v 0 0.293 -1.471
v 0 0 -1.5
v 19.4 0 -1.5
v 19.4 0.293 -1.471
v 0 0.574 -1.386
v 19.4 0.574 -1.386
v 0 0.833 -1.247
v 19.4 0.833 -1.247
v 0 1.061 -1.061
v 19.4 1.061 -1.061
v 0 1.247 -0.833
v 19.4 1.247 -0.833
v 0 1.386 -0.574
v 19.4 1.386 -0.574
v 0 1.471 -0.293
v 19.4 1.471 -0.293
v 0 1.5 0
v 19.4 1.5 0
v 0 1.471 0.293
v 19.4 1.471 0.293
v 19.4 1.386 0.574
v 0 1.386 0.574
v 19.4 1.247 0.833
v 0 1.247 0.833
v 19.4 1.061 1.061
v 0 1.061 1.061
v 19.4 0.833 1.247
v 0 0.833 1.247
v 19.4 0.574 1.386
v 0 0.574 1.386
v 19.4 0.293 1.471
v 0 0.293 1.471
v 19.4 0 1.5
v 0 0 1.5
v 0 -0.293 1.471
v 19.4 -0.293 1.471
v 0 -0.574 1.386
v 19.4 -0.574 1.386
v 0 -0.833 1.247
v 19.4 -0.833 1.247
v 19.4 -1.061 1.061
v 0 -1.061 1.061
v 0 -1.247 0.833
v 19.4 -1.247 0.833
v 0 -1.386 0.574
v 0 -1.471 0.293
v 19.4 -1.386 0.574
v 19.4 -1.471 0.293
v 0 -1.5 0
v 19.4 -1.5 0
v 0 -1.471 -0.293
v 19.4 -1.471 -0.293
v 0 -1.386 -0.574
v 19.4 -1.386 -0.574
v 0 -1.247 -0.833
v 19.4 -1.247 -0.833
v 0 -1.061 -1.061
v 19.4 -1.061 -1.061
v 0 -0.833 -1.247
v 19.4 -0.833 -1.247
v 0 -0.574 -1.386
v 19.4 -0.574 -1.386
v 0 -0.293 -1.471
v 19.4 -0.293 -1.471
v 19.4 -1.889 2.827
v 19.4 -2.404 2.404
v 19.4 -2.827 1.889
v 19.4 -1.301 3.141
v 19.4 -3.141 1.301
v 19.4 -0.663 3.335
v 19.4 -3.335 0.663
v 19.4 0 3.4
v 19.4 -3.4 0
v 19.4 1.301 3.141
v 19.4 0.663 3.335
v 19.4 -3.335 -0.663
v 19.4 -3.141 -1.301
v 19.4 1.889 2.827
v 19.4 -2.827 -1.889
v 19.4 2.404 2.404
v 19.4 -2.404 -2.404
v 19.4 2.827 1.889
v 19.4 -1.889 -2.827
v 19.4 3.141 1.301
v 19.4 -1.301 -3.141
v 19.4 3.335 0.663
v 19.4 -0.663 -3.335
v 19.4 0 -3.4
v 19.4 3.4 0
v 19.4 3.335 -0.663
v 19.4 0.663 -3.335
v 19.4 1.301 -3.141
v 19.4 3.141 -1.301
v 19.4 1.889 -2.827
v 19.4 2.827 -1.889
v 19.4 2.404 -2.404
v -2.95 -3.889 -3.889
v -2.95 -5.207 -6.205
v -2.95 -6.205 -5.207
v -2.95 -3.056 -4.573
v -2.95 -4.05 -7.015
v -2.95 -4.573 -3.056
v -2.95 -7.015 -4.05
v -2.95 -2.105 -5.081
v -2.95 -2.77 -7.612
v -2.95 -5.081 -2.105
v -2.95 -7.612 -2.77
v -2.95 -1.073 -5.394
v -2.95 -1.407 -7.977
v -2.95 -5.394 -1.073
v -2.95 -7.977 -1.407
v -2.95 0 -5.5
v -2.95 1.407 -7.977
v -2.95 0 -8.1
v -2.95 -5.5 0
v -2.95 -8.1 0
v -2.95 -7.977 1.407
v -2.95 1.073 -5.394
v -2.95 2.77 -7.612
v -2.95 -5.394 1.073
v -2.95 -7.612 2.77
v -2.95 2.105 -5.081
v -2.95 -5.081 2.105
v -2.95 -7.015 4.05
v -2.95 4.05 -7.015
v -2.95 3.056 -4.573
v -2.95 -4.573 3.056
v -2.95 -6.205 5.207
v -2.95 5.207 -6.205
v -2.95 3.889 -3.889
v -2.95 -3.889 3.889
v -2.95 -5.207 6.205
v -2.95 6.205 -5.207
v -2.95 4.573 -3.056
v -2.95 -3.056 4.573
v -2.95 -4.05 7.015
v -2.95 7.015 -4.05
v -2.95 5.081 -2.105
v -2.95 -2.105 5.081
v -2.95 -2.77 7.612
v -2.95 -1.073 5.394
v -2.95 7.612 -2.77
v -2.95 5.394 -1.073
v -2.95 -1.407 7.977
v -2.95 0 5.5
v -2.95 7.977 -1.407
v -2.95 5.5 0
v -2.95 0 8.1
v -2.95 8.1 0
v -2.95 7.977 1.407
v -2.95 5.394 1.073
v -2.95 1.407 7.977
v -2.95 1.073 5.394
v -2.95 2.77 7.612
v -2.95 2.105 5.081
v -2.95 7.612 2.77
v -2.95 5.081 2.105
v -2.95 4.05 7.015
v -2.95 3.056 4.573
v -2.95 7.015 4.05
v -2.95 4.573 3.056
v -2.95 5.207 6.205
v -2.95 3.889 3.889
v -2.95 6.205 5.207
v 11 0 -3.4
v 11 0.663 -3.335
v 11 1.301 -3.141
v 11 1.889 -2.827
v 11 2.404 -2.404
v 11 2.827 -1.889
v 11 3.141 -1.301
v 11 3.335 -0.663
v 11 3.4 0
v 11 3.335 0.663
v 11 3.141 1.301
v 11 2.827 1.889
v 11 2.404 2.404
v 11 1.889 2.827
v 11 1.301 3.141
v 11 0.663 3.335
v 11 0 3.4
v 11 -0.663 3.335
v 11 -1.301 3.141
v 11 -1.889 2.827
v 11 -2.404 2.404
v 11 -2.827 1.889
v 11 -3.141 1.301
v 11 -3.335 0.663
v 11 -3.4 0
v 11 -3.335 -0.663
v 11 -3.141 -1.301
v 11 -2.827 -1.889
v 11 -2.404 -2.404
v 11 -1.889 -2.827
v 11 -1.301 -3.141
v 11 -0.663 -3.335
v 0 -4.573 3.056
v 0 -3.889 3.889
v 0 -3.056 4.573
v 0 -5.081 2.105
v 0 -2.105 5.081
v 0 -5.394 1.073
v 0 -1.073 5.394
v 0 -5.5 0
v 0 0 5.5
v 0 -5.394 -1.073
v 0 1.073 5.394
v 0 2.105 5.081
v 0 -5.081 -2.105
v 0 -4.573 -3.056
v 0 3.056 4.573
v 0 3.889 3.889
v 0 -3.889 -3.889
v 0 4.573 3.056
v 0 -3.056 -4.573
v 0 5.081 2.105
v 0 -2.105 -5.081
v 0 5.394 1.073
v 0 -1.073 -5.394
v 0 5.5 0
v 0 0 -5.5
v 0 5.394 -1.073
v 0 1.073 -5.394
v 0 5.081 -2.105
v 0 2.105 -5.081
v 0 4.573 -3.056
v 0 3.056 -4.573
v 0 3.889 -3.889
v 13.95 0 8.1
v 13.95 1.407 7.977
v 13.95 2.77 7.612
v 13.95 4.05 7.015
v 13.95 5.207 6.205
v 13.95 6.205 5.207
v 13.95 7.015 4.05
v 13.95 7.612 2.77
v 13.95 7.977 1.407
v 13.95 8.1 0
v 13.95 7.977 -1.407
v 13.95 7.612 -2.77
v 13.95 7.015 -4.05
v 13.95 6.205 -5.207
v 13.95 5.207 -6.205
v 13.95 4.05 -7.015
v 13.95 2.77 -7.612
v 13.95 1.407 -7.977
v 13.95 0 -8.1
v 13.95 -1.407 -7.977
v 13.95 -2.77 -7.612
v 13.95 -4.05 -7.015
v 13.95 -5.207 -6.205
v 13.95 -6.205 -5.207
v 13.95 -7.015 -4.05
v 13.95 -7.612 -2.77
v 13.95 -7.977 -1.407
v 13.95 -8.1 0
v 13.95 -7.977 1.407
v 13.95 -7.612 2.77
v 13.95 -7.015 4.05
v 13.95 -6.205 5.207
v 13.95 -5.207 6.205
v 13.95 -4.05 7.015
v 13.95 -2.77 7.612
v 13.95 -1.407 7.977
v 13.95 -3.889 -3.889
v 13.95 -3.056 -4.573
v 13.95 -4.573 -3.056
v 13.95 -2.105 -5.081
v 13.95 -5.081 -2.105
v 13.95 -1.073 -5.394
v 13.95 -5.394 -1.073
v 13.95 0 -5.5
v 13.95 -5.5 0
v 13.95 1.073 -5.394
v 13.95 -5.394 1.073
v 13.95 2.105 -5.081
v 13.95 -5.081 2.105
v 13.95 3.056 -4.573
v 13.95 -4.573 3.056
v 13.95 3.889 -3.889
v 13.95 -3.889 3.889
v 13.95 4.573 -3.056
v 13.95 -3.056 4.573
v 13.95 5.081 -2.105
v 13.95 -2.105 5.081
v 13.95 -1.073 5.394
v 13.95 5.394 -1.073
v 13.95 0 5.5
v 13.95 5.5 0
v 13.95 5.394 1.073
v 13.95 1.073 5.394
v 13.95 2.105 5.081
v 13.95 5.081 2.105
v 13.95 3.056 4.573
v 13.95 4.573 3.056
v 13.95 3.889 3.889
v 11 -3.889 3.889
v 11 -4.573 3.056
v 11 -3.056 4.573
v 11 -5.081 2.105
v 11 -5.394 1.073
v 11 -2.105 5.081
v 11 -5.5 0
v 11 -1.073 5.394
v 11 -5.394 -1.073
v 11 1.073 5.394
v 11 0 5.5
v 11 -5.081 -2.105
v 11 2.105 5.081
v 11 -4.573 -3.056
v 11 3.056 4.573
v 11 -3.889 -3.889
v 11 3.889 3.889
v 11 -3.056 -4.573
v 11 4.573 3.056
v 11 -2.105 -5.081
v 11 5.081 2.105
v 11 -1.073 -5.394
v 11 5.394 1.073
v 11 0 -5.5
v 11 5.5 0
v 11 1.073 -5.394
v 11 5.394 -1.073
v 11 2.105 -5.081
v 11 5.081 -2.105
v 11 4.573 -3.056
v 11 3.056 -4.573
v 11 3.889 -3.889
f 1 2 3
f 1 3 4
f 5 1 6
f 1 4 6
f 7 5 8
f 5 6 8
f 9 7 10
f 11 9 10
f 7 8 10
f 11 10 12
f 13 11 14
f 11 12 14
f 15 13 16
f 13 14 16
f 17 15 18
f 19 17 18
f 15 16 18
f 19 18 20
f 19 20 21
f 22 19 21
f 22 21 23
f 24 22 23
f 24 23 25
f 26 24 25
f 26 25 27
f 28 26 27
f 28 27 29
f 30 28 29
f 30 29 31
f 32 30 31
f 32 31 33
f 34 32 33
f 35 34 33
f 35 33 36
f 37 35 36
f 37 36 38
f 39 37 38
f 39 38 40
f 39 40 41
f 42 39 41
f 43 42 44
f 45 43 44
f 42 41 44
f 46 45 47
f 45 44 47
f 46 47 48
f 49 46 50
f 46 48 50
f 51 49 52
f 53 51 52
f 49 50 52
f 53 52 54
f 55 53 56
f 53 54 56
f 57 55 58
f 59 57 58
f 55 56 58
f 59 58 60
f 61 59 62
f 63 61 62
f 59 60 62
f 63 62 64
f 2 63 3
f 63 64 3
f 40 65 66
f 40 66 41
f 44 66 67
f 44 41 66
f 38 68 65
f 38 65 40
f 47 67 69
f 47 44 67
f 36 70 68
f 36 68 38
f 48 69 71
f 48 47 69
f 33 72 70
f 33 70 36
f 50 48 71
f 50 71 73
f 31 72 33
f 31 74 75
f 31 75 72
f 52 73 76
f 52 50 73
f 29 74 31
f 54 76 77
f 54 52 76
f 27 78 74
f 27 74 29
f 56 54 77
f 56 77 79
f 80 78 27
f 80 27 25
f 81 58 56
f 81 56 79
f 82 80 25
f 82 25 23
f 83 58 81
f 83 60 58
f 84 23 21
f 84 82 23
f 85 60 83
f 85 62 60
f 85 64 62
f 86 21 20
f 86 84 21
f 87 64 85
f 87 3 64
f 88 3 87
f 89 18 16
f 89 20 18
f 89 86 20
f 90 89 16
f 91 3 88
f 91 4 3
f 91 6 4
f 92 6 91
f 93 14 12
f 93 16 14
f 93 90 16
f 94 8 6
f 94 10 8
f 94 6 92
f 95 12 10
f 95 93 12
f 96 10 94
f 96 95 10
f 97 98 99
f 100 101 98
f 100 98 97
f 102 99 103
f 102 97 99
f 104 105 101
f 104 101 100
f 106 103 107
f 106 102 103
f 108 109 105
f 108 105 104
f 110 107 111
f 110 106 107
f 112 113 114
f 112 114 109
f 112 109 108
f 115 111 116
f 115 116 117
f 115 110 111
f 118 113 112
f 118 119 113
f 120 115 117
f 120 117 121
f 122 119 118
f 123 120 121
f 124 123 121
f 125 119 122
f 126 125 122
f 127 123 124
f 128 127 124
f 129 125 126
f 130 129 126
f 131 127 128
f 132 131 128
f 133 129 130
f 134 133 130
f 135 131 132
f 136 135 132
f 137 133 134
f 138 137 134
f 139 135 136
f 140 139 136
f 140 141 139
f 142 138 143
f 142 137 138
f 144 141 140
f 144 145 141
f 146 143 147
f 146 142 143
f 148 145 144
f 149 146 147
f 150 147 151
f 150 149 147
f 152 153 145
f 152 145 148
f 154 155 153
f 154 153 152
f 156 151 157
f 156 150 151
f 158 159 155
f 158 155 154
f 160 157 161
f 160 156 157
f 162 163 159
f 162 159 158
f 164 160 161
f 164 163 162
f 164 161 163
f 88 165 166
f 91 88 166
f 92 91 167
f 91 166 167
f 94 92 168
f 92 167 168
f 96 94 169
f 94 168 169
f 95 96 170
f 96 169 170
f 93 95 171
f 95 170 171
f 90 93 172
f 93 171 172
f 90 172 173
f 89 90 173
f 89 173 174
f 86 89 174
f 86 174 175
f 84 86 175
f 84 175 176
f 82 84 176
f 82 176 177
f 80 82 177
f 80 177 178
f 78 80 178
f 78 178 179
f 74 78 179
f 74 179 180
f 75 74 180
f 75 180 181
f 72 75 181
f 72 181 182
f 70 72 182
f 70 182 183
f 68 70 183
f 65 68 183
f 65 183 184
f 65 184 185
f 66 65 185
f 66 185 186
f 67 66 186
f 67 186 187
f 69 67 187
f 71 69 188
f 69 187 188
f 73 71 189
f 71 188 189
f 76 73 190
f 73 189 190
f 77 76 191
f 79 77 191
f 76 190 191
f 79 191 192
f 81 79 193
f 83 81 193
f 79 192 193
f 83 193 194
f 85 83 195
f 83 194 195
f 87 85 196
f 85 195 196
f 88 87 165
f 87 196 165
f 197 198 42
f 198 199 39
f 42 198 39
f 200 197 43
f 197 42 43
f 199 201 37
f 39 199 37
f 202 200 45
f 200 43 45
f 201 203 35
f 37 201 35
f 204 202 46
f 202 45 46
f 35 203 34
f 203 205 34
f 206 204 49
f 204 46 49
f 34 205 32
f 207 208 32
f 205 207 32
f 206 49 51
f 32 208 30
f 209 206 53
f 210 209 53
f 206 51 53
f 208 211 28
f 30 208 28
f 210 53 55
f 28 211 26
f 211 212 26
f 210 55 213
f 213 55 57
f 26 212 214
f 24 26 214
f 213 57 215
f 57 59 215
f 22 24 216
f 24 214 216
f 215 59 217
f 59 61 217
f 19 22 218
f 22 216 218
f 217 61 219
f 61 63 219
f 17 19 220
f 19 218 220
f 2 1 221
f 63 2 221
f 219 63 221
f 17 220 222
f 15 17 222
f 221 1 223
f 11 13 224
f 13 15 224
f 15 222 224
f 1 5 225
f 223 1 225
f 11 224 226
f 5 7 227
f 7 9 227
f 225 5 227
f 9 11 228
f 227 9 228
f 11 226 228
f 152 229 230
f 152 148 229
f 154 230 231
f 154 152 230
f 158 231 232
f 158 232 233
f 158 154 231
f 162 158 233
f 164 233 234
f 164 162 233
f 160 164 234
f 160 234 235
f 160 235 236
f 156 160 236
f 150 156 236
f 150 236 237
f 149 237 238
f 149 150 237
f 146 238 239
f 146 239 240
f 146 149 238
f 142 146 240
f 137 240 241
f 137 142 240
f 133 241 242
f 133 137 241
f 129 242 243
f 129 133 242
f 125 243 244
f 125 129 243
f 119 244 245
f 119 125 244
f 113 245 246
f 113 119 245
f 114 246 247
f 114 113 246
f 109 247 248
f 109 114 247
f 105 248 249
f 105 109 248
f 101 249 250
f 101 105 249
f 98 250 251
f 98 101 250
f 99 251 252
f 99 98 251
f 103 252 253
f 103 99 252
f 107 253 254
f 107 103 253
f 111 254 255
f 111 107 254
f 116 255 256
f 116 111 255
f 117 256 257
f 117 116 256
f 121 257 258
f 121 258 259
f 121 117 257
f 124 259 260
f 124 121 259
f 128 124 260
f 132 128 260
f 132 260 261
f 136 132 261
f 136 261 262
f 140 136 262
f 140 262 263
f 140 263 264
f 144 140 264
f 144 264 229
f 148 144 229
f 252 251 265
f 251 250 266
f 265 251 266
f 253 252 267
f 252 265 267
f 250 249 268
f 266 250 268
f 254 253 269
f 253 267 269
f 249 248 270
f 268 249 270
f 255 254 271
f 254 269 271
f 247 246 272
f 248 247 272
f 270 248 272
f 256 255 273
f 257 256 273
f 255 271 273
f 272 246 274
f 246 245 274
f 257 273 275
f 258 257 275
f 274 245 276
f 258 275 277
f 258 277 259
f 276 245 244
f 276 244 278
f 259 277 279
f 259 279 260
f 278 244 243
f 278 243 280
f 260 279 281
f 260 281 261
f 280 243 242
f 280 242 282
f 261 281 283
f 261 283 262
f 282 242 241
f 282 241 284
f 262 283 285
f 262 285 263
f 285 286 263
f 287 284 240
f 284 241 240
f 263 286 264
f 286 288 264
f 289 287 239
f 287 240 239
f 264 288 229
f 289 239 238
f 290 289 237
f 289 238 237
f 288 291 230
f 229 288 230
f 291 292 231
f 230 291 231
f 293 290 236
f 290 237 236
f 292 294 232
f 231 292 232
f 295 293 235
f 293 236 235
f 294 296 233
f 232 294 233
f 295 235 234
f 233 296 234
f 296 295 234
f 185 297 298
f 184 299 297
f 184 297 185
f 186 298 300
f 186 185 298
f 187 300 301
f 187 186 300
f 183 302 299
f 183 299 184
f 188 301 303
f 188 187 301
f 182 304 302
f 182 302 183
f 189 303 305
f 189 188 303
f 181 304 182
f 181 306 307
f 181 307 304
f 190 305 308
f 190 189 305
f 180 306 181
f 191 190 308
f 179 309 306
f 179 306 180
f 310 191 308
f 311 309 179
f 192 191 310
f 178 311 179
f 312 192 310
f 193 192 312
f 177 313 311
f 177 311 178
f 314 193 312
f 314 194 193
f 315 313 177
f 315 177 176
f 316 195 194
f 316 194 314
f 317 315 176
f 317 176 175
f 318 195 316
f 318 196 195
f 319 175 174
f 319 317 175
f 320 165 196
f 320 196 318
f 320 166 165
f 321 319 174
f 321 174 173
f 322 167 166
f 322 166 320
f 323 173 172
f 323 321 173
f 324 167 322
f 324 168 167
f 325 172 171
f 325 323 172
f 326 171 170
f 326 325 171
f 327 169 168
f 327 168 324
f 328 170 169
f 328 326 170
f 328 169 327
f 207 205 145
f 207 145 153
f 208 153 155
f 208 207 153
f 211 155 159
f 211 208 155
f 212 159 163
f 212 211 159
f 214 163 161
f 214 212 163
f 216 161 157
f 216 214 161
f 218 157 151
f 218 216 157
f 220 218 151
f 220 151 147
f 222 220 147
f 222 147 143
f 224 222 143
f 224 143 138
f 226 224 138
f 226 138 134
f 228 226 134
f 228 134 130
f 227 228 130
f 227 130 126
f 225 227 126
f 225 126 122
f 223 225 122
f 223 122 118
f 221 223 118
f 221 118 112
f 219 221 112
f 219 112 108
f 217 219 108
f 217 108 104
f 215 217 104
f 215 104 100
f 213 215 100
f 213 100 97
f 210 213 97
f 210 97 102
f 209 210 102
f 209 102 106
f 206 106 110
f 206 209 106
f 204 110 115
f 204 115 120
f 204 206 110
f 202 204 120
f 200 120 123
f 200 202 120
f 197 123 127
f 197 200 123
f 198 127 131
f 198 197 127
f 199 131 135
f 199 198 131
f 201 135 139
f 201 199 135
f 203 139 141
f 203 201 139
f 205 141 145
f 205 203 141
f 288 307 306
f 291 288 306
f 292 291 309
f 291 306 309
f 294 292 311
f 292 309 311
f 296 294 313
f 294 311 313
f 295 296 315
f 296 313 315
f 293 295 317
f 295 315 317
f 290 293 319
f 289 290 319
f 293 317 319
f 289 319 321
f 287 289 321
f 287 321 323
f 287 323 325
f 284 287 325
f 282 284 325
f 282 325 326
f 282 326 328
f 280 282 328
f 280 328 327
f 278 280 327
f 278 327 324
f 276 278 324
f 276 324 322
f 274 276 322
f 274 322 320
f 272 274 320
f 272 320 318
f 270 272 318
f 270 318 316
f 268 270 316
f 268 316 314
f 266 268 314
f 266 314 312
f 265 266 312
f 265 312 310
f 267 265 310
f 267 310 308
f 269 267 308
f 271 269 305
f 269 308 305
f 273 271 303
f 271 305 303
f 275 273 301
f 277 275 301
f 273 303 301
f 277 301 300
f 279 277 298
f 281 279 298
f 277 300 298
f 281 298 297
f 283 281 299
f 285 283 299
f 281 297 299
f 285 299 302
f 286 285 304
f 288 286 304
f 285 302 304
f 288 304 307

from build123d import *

# Parameters (mm, degrees)
SKETCH_1_R           = 5.5
EXTRUDE_1_DEPTH      = 11
SKETCH_2_R           = 2.7
CUT_EXTRUDE_1_DEPTH  = 9.35
SKETCH_4_R           = 3.4
EXTRUDE_2_DEPTH      = 17.75
SKETCH_5_R           = 1.5
CUT_EXTRUDE_4_DEPTH  = 25.75
SKETCH_6_R           = 8.1
SKETCH_6_R_2         = 5.5
EXTRUDE_4_DEPTH      = 2.95
EXTRUDE_4_DEPTH_BACK = 13.95


with BuildPart() as part:
    # ｽｹｯﾁ1 → ﾎﾞｽ - 押し出し1 (new body)
    with BuildSketch(Plane(origin=(0, 0, 0), x_dir=(0, 0, -1), z_dir=(1, 0, 0))):
        Circle(SKETCH_1_R)
    extrude(amount=EXTRUDE_1_DEPTH)

    # ｽｹｯﾁ2 → ｶｯﾄ - 押し出し1 (cut)
    with BuildSketch(Plane(origin=(11, 0, 0), x_dir=(0, 0, -1), z_dir=(1, 0, 0))):
        Circle(SKETCH_2_R)
    extrude(amount=-CUT_EXTRUDE_1_DEPTH, mode=Mode.SUBTRACT)

    # ｽｹｯﾁ4 → ﾎﾞｽ - 押し出し2 (add)
    with BuildSketch(Plane(origin=(1.65, 0, 0), x_dir=(0, 0, -1), z_dir=(1, 0, 0))):
        Circle(SKETCH_4_R)
    extrude(amount=EXTRUDE_2_DEPTH)

    # ｽｹｯﾁ5 → ｶｯﾄ - 押し出し4 (cut)
    with BuildSketch(Plane(origin=(19.4, 0, 0), x_dir=(0, 0, -1), z_dir=(1, 0, 0))):
        Circle(SKETCH_5_R)
    extrude(amount=-CUT_EXTRUDE_4_DEPTH, mode=Mode.SUBTRACT)

    # ｽｹｯﾁ6 → ﾎﾞｽ - 押し出し4 (add, two sides)
    with BuildSketch(Plane.ZY) as extrude_4_sk:
        Circle(SKETCH_6_R)
        Circle(SKETCH_6_R_2, mode=Mode.SUBTRACT)
    extrude(amount=EXTRUDE_4_DEPTH)
    extrude(extrude_4_sk.sketch, amount=-EXTRUDE_4_DEPTH_BACK)


solid = part.part
